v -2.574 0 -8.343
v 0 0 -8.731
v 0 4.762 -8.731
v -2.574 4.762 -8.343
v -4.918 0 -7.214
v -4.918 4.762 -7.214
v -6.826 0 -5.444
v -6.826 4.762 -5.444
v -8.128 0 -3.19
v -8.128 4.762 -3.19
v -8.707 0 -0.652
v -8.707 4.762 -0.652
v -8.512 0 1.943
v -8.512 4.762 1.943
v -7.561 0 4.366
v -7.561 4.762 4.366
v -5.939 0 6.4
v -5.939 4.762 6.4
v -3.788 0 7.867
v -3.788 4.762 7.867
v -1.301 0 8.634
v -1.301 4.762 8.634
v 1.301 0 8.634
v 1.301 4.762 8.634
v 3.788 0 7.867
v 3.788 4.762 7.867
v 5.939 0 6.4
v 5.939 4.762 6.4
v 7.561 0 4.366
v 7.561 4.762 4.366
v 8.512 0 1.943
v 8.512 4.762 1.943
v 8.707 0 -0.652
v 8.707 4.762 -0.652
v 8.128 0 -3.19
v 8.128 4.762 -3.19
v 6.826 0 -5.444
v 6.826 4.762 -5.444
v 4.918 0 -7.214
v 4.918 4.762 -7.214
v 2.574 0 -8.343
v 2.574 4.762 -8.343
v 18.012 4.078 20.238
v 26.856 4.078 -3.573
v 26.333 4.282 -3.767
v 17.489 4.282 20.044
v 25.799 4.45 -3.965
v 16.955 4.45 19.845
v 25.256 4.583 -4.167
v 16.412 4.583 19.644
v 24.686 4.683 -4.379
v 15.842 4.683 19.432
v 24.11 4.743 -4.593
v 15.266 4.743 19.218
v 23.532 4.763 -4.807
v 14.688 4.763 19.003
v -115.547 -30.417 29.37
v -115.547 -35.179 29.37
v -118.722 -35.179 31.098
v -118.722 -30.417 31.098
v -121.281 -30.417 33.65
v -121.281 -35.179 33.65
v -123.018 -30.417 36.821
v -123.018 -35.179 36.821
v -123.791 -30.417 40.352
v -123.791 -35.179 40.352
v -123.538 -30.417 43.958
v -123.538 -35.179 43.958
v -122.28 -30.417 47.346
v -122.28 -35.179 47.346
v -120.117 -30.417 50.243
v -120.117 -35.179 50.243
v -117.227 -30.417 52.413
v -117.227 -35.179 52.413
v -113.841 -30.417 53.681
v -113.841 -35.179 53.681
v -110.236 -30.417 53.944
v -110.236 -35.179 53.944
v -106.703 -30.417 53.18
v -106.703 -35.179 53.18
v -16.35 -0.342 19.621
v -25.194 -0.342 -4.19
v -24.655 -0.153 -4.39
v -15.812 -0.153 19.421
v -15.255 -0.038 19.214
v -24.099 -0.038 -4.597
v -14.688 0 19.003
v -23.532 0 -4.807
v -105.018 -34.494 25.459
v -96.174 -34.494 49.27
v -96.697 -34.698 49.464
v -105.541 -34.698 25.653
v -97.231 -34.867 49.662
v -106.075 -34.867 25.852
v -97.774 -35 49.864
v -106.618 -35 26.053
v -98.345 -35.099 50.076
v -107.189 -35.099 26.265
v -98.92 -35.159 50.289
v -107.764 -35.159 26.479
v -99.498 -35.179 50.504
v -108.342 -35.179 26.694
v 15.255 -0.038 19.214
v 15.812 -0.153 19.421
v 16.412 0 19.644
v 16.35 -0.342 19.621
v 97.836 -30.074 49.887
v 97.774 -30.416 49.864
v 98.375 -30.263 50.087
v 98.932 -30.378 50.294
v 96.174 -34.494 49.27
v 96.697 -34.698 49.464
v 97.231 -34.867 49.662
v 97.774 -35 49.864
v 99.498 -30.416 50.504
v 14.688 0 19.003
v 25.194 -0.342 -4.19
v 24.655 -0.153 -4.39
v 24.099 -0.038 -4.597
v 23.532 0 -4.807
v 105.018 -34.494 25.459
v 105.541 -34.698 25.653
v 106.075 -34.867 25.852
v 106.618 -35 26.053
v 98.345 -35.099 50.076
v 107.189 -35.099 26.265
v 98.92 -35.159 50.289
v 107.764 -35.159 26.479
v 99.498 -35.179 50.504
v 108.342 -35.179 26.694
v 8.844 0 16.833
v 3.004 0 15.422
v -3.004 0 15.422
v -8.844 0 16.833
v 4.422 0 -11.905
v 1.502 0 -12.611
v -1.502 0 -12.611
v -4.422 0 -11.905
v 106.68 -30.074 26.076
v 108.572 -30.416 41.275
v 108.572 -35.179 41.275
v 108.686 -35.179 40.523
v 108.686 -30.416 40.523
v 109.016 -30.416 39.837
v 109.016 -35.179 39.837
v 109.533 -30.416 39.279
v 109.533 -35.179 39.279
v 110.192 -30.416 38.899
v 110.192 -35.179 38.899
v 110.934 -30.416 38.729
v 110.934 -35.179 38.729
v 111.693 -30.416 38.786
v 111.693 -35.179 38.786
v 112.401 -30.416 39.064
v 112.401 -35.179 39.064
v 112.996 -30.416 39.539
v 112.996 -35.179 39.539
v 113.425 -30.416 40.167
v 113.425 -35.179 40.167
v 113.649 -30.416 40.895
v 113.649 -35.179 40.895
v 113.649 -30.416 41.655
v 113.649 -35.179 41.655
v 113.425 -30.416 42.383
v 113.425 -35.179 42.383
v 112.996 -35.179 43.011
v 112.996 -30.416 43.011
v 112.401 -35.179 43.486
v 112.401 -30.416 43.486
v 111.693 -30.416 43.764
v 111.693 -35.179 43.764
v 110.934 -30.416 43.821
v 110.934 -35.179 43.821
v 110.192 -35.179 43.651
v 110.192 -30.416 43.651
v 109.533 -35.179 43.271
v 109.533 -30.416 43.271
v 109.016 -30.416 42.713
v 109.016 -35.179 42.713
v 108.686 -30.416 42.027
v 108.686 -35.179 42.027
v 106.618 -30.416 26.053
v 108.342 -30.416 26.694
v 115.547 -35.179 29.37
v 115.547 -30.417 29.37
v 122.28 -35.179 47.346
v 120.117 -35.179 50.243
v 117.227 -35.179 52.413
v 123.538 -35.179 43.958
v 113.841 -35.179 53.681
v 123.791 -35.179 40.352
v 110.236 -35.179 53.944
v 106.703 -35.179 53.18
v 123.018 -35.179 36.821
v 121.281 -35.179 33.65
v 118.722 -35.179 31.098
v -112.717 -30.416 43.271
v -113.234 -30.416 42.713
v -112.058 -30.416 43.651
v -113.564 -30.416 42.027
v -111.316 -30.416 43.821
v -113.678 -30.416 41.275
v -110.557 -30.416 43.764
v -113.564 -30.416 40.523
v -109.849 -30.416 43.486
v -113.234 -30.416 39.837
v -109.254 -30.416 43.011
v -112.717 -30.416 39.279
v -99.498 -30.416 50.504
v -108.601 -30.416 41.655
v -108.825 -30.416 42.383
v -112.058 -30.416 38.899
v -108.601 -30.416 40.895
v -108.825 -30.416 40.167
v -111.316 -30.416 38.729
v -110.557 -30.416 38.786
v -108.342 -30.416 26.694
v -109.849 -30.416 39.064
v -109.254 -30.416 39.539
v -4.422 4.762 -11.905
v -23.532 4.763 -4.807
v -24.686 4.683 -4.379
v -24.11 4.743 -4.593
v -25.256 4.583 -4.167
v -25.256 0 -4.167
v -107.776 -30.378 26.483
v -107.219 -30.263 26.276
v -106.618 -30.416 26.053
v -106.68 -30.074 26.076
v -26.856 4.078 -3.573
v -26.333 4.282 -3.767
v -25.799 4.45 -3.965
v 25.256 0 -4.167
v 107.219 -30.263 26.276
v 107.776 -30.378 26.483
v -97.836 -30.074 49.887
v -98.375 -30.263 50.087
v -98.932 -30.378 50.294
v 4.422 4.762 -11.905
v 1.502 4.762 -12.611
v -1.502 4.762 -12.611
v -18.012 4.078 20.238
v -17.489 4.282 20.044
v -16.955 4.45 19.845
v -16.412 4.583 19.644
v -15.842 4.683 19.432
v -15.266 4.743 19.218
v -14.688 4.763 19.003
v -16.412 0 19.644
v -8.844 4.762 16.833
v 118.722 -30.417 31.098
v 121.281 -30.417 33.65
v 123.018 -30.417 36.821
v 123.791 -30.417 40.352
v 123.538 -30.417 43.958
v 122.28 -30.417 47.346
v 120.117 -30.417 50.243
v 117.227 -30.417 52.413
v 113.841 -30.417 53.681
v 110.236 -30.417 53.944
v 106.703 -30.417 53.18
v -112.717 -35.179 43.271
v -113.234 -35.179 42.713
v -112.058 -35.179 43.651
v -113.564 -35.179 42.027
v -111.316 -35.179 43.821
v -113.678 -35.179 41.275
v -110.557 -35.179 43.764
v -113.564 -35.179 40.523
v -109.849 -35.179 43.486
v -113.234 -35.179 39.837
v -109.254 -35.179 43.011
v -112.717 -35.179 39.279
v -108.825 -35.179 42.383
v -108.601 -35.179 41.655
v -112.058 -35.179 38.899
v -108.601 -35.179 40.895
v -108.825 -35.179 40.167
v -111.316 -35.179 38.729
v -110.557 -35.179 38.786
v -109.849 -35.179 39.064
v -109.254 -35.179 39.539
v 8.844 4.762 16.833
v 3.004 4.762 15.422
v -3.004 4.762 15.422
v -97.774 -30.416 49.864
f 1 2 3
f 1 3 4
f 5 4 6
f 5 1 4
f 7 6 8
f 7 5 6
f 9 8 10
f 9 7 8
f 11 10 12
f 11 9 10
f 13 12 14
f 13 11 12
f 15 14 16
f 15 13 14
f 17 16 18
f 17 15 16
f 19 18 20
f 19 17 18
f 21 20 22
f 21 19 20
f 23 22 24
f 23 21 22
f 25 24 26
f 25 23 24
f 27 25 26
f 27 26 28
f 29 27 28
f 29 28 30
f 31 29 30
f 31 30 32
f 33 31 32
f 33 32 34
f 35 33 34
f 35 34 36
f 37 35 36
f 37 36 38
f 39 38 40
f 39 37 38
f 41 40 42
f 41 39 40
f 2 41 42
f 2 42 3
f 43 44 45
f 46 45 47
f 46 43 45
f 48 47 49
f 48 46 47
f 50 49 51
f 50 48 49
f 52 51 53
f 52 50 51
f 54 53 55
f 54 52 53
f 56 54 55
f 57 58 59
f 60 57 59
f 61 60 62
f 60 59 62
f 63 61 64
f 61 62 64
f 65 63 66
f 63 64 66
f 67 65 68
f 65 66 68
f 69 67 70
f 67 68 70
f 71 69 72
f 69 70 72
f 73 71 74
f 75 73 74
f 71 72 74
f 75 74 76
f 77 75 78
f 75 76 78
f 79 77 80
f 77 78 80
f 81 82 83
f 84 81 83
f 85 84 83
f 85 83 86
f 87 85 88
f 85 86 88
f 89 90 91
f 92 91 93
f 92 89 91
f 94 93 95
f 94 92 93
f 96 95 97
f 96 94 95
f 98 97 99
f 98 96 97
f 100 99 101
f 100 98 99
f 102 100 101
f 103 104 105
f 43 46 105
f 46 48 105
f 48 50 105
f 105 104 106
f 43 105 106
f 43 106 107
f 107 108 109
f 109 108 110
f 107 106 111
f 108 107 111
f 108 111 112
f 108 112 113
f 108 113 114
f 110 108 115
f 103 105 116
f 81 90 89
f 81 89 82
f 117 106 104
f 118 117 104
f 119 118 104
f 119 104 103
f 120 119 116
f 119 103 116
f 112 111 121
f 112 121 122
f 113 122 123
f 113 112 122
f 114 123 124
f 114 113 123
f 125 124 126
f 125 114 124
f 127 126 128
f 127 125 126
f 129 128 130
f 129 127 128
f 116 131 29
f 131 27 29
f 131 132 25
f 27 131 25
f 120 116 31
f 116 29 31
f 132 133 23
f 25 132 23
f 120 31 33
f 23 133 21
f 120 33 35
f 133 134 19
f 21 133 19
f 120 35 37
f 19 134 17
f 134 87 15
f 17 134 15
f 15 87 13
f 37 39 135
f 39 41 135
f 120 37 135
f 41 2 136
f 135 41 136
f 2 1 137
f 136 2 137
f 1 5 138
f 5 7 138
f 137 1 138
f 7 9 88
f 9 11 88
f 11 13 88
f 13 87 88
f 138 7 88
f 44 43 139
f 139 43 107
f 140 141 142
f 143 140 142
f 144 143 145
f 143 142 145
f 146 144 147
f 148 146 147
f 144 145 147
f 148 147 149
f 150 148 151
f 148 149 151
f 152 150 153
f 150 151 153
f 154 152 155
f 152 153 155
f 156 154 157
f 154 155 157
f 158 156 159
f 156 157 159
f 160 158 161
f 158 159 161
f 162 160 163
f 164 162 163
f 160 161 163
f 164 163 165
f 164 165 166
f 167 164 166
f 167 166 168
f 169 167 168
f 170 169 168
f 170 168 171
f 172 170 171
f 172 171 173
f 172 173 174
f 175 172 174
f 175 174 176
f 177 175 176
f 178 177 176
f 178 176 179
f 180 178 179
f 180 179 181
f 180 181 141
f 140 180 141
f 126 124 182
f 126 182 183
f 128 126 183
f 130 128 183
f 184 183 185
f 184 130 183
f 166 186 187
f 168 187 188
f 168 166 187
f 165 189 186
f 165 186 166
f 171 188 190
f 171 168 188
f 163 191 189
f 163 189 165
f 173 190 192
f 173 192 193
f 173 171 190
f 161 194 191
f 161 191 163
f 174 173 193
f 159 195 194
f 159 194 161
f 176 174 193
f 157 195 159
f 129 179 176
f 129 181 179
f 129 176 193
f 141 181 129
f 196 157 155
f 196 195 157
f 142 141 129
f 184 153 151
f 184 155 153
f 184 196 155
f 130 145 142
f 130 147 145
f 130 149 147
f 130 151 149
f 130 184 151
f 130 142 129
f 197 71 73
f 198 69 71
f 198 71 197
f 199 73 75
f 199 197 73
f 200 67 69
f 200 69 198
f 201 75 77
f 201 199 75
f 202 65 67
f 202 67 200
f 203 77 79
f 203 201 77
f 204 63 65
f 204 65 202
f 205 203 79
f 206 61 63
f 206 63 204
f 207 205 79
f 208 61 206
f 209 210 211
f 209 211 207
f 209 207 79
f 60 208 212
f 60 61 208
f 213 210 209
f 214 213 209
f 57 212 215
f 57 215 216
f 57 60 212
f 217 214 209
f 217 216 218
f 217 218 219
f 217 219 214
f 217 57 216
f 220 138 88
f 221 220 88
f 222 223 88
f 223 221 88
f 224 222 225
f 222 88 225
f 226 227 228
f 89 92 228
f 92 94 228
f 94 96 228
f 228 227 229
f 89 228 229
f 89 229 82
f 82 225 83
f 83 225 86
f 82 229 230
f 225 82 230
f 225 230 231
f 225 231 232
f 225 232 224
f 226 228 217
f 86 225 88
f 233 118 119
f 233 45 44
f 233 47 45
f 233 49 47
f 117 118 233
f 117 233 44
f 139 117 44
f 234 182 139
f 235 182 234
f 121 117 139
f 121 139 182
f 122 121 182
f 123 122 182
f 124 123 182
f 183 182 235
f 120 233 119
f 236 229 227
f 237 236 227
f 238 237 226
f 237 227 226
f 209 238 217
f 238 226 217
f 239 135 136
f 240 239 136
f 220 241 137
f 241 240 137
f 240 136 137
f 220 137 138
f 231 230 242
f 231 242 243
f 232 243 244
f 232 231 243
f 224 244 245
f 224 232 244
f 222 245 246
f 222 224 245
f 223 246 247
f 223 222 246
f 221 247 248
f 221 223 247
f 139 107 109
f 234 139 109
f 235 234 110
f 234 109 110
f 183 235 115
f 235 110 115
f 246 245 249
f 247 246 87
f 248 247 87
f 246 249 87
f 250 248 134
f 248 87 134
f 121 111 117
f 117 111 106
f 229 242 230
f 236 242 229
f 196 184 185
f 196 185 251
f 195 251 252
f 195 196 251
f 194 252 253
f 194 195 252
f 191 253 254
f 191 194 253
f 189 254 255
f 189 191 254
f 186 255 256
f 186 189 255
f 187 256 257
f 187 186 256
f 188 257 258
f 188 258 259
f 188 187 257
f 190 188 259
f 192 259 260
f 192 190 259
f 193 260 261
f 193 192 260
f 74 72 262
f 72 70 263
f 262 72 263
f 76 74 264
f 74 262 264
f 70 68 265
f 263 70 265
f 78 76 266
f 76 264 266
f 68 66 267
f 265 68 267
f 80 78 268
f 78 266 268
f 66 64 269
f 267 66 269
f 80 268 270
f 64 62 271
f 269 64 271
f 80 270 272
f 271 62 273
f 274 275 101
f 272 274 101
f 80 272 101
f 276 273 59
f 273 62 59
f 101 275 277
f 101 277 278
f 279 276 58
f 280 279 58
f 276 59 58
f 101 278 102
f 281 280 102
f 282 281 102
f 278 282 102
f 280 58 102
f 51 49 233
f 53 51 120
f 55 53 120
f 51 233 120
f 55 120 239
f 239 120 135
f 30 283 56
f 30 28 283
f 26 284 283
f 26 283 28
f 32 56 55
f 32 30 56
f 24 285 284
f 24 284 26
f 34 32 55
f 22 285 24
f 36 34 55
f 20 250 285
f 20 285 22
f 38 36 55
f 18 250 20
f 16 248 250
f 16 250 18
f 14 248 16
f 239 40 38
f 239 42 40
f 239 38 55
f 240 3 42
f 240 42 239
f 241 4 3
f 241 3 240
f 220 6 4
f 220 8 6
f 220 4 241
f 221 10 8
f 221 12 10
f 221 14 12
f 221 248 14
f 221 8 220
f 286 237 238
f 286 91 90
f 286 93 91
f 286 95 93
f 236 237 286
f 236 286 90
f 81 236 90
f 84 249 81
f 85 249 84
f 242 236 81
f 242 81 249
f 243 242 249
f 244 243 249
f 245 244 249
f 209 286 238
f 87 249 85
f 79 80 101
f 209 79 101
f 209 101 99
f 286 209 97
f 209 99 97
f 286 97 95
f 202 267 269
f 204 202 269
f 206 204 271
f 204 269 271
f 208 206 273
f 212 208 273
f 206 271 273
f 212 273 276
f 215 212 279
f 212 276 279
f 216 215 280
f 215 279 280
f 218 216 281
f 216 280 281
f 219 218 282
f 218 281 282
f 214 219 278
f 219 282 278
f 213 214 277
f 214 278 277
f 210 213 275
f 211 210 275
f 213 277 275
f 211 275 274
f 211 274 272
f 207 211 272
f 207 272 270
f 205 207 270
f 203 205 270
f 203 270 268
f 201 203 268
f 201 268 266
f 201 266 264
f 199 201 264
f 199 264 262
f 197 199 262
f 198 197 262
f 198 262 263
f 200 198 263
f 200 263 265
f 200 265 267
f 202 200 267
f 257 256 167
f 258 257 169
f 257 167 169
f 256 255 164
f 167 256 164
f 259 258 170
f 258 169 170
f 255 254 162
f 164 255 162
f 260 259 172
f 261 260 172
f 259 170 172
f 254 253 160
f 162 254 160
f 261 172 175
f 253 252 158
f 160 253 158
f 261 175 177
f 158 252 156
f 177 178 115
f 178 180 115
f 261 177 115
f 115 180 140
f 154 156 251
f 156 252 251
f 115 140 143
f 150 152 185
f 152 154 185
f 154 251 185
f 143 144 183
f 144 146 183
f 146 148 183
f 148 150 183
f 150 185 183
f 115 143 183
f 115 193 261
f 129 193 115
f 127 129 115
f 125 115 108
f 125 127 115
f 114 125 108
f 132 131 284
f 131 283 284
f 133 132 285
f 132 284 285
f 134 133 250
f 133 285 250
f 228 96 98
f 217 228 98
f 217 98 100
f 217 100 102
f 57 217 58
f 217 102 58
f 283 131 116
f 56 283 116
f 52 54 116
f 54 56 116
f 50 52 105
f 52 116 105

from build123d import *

# Parameters (mm, degrees)
SKETCH1_R              = 12.7
SKETCH1_R_2            = 8.73125
BOSS_EXTRUDE1_DEPTH    = 4.7625
BOSS_EXTRUDE5_DEPTH    = 4.7625
BOSS_EXTRUDE2_DEPTH    = 4.7625
BOSS_EXTRUDE2_2_DEPTH  = 4.7625
BOSS_EXTRUDE3_DEPTH    = 12.7
FILLET2_R              = 25.4
F_10_CLEARANCE_HOLE1_D = 5.1054
CONVERT_SOLID1_START   = -12.7
CONVERT_SOLID1_DEPTH   = 25.4
CONVERT_SOLID1_2_DEPTH = 25.4
CONVERT_SOLID1_3_DEPTH = 25.4
CONVERT_SOLID1_4_DEPTH = 25.4


# Read off the part's stored shape, not the designer's step: Convert-Solid1
with BuildPart() as part:
    # Sketch1 → Boss-Extrude1 (new body)
    with BuildSketch(Plane(origin=(0, 0, 0), x_dir=(1, 0, 0), z_dir=(0, 1, 0))):
        with Locations(Location((0, 0, 0), (0, 0, 90))):
            Circle(SKETCH1_R)
        with Locations(Location((0, 0, 0), (0, 0, 90))):
            Circle(SKETCH1_R_2, mode=Mode.SUBTRACT)
    extrude(amount=BOSS_EXTRUDE1_DEPTH)

    # Sketch1<5> → Boss-Extrude5 (add)
    with BuildSketch(Plane(origin=(0, 0, 0), x_dir=(1, 0, 0), z_dir=(0, 1, 0))):
        with BuildLine():
            Line((-25.256245596, 4.166855334), (-16.412307744, -19.643746575))
            Line((-16.412307744, -19.643746575), (0, -13.547746556))
            Line((0, -13.547746556), (-4.421968926, -11.905300955))
            ThreePointArc((-4.421968926, -11.905300955), (-12.7, 0), (-4.421968926, 11.905300955))
            Line((-4.421968926, 11.905300955), (-25.256245596, 4.166855334))
        make_face()
        with BuildLine():
            Line((-4.421968926, -11.905300955), (0, -13.547746556))
            Line((0, -13.547746556), (4.421968926, -11.905300955))
            ThreePointArc((4.421968926, -11.905300955), (0, -12.7), (-4.421968926, -11.905300955))
        make_face()
        with BuildLine():
            Line((4.421968926, -11.905300955), (0, -13.547746556))
            Line((0, -13.547746556), (16.412307744, -19.643746575))
            Line((16.412307744, -19.643746575), (25.256245596, 4.166855334))
            Line((25.256245596, 4.166855334), (4.421968926, 11.905300955))
            ThreePointArc((4.421968926, 11.905300955), (10.427104233, 7.250206709), (12.7, 0))
            ThreePointArc((12.7, 0), (10.427104233, -7.250206709), (4.421968926, -11.905300955))
        make_face()
    extrude(amount=BOSS_EXTRUDE5_DEPTH)



with BuildPart() as body_2:
    # Sketch3 → Boss-Extrude2 (new body)
    with BuildSketch(Plane(origin=(0, -35.179, 0), x_dir=(1, 0, 0), z_dir=(0, 1, 0))):
        with BuildLine():
            Line((-106.61799321, -26.053222351), (-115.546968926, -29.369699045))
            ThreePointArc((-115.546968926, -29.369699045), (-123.030300955, -45.696968926), (-106.703031074, -53.180300955))
            Line((-106.703031074, -53.180300955), (-97.774055358, -49.86382426))
            Line((-97.774055358, -49.86382426), (-106.61799321, -26.053222351))
        make_face()
    extrude(amount=BOSS_EXTRUDE2_DEPTH)


with BuildPart() as body_3:
    # Sketch3 → Boss-Extrude2 2 (new body)
    with BuildSketch(Plane(origin=(0, -35.179, 0), x_dir=(1, 0, 0), z_dir=(0, 1, 0))):
        with BuildLine():
            ThreePointArc((115.546968926, -29.369699045), (123.030300955, -45.696968926), (106.703031074, -53.180300955))
            Line((106.703031074, -53.180300955), (97.774055358, -49.86382426))
            Line((97.774055358, -49.86382426), (106.61799321, -26.053222351))
            Line((106.61799321, -26.053222351), (115.546968926, -29.369699045))
        make_face()
    extrude(amount=BOSS_EXTRUDE2_2_DEPTH)


with BuildPart() as part_1:
    add(part.part)

    add(body_2.part)  # Boss-Extrude3 merges body 2
    # Sketch4 → Boss-Extrude3 (add, symmetric)
    with BuildSketch(Plane(origin=(0, 0, 0), x_dir=(0.9374252720097653, 0, -0.34818652960362706), z_dir=(0.34818652960362706, 0, 0.9374252720097653))):
        Polygon((-109.937239497, -30.4165), (-109.017782361, -30.4165), (-109.017782361, -35.179), (-21.305542864, 0), (-22.225, 0), (-22.225, 4.7625), align=None)
    boss_extrude3 = extrude(amount=BOSS_EXTRUDE3_DEPTH, both=True)

    # Mirror1: Boss-Extrude3 across plane
    add(boss_extrude3.mirror(Plane(origin=(0, 0, 0), x_dir=(0, 0, 1), z_dir=(1, 0, 0))))


with BuildPart() as body_3_1:
    add(body_3.part)

    # Combine1: union part
    add(part_1.part)

    # Fillet2
    fillet2_edges = [body_3_1.edges().sort_by_distance(p)[0] for p in [
        (0, 2.38125, 13.547746556),
    ]]
    fillet(fillet2_edges, radius=FILLET2_R)

    # #10 Clearance Hole1 (through all)
    with Locations(Plane(origin=(0, -30.4165, 0), x_dir=(1, 0, 0), z_dir=(0, 1, 0))):
        with Locations((-111.125, -41.275), (111.125, -41.275)):
            Hole(F_10_CLEARANCE_HOLE1_D / 2)

    # Convert-Solid1 outline → Convert-Solid1 (add)
    with BuildSketch(Plane(origin=(0, 0, 0), x_dir=(0.9374252720097653, 0, -0.3481865296036272), z_dir=(0.34818652960362717, 0, 0.9374252720097654)).offset(CONVERT_SOLID1_START)):
        with BuildLine():
            ThreePointArc((-109.083861056, -30.074233056), (-109.953910301, -30.330150456), (-110.856696633, -30.4165))
            Line((-110.856696633, -30.4165), (-109.937239497, -30.4165))
            Line((-109.937239497, -30.4165), (-109.083861056, -30.074233056))
        make_face()
        with BuildLine():
            Line((-21.305542864, 0), (-22.158921305, -0.342266944))
            ThreePointArc((-22.158921305, -0.342266944), (-21.28887206, -0.086349544), (-20.386085729, 0))
            Line((-20.386085729, 0), (-21.305542864, 0))
        make_face()
    extrude(amount=CONVERT_SOLID1_DEPTH)

    # Convert-Solid1 2 outline → Convert-Solid1 2 (add)
    with BuildSketch(Plane(origin=(0, 0, 0), x_dir=(0.9374252720097653, 0, 0.3481865296036272), z_dir=(0.34818652960362717, 0, -0.9374252720097654)).offset(CONVERT_SOLID1_START)):
        with BuildLine():
            ThreePointArc((109.083861056, 30.074233056), (109.953910301, 30.330150456), (110.856696633, 30.4165))
            Line((110.856696633, 30.4165), (109.937239497, 30.4165))
            Line((109.937239497, 30.4165), (109.083861056, 30.074233056))
        make_face()
        with BuildLine():
            Line((21.305542864, 0), (22.158921305, 0.342266944))
            ThreePointArc((22.158921305, 0.342266944), (21.28887206, 0.086349544), (20.386085729, 0))
            Line((20.386085729, 0), (21.305542864, 0))
        make_face()
    extrude(amount=CONVERT_SOLID1_2_DEPTH)

    # Convert-Solid1 3 outline → Convert-Solid1 3 (cut)
    with BuildSketch(Plane(origin=(0, 0, 0), x_dir=(0.9374252720097653, 0, -0.3481865296036272), z_dir=(0.34818652960362717, 0, 0.9374252720097654)).offset(CONVERT_SOLID1_START)):
        with BuildLine():
            Line((-22.225, 4.7625), (-23.931756882, 4.077966112))
            ThreePointArc((-23.931756882, 4.077966112), (-22.191658392, 4.589800912), (-20.386085729, 4.7625))
            Line((-20.386085729, 4.7625), (-22.225, 4.7625))
        make_face()
        with BuildLine():
            ThreePointArc((-107.31102548, -34.494466112), (-109.05112397, -35.006300912), (-110.856696633, -35.179))
            Line((-110.856696633, -35.179), (-109.017782361, -35.179))
            Line((-109.017782361, -35.179), (-107.31102548, -34.494466112))
        make_face()
    extrude(amount=CONVERT_SOLID1_3_DEPTH, mode=Mode.SUBTRACT)

    # Convert-Solid1 4 outline → Convert-Solid1 4 (cut)
    with BuildSketch(Plane(origin=(0, 0, 0), x_dir=(0.9374252720097653, 0, 0.3481865296036272), z_dir=(0.34818652960362717, 0, -0.9374252720097654)).offset(CONVERT_SOLID1_START)):
        with BuildLine():
            Line((22.225, -4.7625), (23.931756882, -4.077966112))
            ThreePointArc((23.931756882, -4.077966112), (22.191658392, -4.589800912), (20.386085729, -4.7625))
            Line((20.386085729, -4.7625), (22.225, -4.7625))
        make_face()
        with BuildLine():
            ThreePointArc((107.31102548, 34.494466112), (109.05112397, 35.006300912), (110.856696633, 35.179))
            Line((110.856696633, 35.179), (109.017782361, 35.179))
            Line((109.017782361, 35.179), (107.31102548, 34.494466112))
        make_face()
    extrude(amount=CONVERT_SOLID1_4_DEPTH, mode=Mode.SUBTRACT)


solid = body_3_1.part
